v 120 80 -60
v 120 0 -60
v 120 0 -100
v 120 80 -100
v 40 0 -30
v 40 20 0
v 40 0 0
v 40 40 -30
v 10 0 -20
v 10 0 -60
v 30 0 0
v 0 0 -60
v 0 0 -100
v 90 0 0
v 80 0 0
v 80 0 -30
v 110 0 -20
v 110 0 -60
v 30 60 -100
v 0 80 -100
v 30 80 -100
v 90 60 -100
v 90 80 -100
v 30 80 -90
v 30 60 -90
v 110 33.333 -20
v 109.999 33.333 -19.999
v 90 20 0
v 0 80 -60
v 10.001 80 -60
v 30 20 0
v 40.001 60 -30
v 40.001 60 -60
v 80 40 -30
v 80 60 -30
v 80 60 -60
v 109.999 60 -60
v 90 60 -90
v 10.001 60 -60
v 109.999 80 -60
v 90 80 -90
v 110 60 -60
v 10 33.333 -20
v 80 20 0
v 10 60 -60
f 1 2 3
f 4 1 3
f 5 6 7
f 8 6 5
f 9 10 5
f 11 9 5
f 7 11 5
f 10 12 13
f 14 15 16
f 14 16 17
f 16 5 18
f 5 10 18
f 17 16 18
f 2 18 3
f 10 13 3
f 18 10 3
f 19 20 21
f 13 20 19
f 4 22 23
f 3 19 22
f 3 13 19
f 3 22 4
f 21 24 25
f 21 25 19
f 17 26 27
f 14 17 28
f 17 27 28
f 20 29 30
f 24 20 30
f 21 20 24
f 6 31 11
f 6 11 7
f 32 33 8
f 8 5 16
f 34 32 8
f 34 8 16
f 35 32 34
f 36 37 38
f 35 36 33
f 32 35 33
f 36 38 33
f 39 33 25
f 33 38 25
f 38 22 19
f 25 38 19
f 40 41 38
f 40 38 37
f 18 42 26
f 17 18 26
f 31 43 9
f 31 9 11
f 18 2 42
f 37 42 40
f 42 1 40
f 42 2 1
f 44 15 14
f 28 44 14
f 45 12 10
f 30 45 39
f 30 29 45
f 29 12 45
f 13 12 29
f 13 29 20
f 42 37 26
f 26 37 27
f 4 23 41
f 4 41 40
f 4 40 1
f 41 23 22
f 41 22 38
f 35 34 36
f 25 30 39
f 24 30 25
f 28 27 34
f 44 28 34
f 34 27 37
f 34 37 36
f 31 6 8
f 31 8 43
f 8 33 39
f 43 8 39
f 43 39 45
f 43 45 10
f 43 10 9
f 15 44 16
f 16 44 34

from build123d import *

# Parameters (mm, degrees)
SKETCH1_W           = 120
SKETCH1_H           = 100
BOSS_EXTRUDE1_DEPTH = 80
SKETCH2_W           = 40
SKETCH2_H           = 30
CUT_EXTRUDE1_DEPTH  = 80
CUT_EXTRUDE2_DEPTH  = 80
CUT_EXTRUDE6_DEPTH  = 20
SKETCH5_W           = 29.999
SKETCH5_H           = 20
CUT_EXTRUDE7_DEPTH  = 68
SKETCH6_W           = 40.001
SKETCH6_H           = 20
CUT_EXTRUDE8_DEPTH  = 68
SKETCH7_W           = 40.001
SKETCH7_H           = 20
CUT_EXTRUDE9_DEPTH  = 68
CUT_EXTRUDE10_DEPTH = 68
SKETCH13_W          = 29.999
SKETCH13_H          = 72.111025509
CUT_EXTRUDE11_DEPTH = 68
CUT_EXTRUDE12_DEPTH = 68


with BuildPart() as part:
    # Sketch1 → Boss-Extrude1 (new body)
    with BuildSketch(Plane(origin=(0, 0, 0), x_dir=(1, 0, 0), z_dir=(0, 1, 0))):
        with Locations((60, 50)):
            Rectangle(SKETCH1_W, SKETCH1_H)
    extrude(amount=BOSS_EXTRUDE1_DEPTH)

    # Sketch2 → Cut-Extrude1 (cut)
    with BuildSketch(Plane(origin=(0, 80, 0), x_dir=(1, 0, 0), z_dir=(0, 1, 0))):
        with Locations((60, 15)):
            Rectangle(SKETCH2_W, SKETCH2_H)
    extrude(amount=-CUT_EXTRUDE1_DEPTH, mode=Mode.SUBTRACT)

    # Sketch3 → Cut-Extrude2 (cut)
    with BuildSketch(Plane(origin=(0, 80, 0), x_dir=(1, 0, 0), z_dir=(0, 1, 0))):
        Polygon((0, 60), (10, 60), (10, 20), (30, 0), (0, 0), align=None)
        Polygon((120, 60), (110, 60), (110, 20), (90, 0), (120, 0), align=None)
    extrude(amount=-CUT_EXTRUDE2_DEPTH, mode=Mode.SUBTRACT)

    # Sketch4 → Cut-Extrude6 (cut)
    with BuildSketch(Plane(origin=(0, 80, 0), x_dir=(1, 0, 0), z_dir=(0, 1, 0))):
        Polygon((30, 100), (90, 100), (90, 90), (109.999, 60), (80, 60), (80, 30), (40, 30), (40, 60), (10.001, 60), (30, 90), align=None)
    extrude(amount=-CUT_EXTRUDE6_DEPTH, mode=Mode.SUBTRACT)

    # Sketch5 → Cut-Extrude7 (cut)
    with BuildSketch(Plane(origin=(0, 0, -60), x_dir=(-1, 0, 0), z_dir=(0, 0, -1))):
        with Locations((-94.9995, 70)):
            Rectangle(SKETCH5_W, SKETCH5_H)
        with Locations((-25.0005, 70)):
            Rectangle(SKETCH5_W, SKETCH5_H)
    extrude(amount=-CUT_EXTRUDE7_DEPTH, mode=Mode.SUBTRACT)

    # Sketch6 → Cut-Extrude8 (cut)
    with BuildSketch(Plane.ZY.offset(-109.999)):
        with Locations((-39.9995, 70)):
            Rectangle(SKETCH6_W, SKETCH6_H)
    extrude(amount=-CUT_EXTRUDE8_DEPTH, mode=Mode.SUBTRACT)

    # Sketch7 → Cut-Extrude9 (cut)
    with BuildSketch(Plane(origin=(10.001, 0, 0), x_dir=(0, 0, -1), z_dir=(1, 0, 0))):
        with Locations((39.9995, 70)):
            Rectangle(SKETCH7_W, SKETCH7_H)
    extrude(amount=-CUT_EXTRUDE9_DEPTH, mode=Mode.SUBTRACT)

    # Sketch10 → Cut-Extrude10 (cut)
    with BuildSketch(Plane(origin=(-5e-09, 13.846153834, 9.230769225), x_dir=(1, 0, 0), z_dir=(0, 0.832050294, 0.554700196))):
        Polygon((40.001000005, 83.205029422), (40.000000005, 11.094003927), (10.000000005, 11.094003927), (10.000000005, 83.205029436), align=None)
    extrude(amount=CUT_EXTRUDE10_DEPTH, mode=Mode.SUBTRACT)

    # Sketch13 → Cut-Extrude11 (cut)
    with BuildSketch(Plane(origin=(0, 13.846153846, 9.230769231), x_dir=(-1, 0, 0), z_dir=(0, -0.832050294, -0.554700196))):
        with Locations((-94.9995, 47.14951668)):
            Rectangle(SKETCH13_W, SKETCH13_H)
    extrude(amount=-CUT_EXTRUDE11_DEPTH, mode=Mode.SUBTRACT)

    # Sketch14 → Cut-Extrude12 (cut)
    with BuildSketch(Plane.ZY.offset(-109.999)):
        Polygon((-60, 60), (-19.999, 33.332666667), (-19.999, 60), align=None)
    extrude(amount=-CUT_EXTRUDE12_DEPTH, mode=Mode.SUBTRACT)


solid = part.part
